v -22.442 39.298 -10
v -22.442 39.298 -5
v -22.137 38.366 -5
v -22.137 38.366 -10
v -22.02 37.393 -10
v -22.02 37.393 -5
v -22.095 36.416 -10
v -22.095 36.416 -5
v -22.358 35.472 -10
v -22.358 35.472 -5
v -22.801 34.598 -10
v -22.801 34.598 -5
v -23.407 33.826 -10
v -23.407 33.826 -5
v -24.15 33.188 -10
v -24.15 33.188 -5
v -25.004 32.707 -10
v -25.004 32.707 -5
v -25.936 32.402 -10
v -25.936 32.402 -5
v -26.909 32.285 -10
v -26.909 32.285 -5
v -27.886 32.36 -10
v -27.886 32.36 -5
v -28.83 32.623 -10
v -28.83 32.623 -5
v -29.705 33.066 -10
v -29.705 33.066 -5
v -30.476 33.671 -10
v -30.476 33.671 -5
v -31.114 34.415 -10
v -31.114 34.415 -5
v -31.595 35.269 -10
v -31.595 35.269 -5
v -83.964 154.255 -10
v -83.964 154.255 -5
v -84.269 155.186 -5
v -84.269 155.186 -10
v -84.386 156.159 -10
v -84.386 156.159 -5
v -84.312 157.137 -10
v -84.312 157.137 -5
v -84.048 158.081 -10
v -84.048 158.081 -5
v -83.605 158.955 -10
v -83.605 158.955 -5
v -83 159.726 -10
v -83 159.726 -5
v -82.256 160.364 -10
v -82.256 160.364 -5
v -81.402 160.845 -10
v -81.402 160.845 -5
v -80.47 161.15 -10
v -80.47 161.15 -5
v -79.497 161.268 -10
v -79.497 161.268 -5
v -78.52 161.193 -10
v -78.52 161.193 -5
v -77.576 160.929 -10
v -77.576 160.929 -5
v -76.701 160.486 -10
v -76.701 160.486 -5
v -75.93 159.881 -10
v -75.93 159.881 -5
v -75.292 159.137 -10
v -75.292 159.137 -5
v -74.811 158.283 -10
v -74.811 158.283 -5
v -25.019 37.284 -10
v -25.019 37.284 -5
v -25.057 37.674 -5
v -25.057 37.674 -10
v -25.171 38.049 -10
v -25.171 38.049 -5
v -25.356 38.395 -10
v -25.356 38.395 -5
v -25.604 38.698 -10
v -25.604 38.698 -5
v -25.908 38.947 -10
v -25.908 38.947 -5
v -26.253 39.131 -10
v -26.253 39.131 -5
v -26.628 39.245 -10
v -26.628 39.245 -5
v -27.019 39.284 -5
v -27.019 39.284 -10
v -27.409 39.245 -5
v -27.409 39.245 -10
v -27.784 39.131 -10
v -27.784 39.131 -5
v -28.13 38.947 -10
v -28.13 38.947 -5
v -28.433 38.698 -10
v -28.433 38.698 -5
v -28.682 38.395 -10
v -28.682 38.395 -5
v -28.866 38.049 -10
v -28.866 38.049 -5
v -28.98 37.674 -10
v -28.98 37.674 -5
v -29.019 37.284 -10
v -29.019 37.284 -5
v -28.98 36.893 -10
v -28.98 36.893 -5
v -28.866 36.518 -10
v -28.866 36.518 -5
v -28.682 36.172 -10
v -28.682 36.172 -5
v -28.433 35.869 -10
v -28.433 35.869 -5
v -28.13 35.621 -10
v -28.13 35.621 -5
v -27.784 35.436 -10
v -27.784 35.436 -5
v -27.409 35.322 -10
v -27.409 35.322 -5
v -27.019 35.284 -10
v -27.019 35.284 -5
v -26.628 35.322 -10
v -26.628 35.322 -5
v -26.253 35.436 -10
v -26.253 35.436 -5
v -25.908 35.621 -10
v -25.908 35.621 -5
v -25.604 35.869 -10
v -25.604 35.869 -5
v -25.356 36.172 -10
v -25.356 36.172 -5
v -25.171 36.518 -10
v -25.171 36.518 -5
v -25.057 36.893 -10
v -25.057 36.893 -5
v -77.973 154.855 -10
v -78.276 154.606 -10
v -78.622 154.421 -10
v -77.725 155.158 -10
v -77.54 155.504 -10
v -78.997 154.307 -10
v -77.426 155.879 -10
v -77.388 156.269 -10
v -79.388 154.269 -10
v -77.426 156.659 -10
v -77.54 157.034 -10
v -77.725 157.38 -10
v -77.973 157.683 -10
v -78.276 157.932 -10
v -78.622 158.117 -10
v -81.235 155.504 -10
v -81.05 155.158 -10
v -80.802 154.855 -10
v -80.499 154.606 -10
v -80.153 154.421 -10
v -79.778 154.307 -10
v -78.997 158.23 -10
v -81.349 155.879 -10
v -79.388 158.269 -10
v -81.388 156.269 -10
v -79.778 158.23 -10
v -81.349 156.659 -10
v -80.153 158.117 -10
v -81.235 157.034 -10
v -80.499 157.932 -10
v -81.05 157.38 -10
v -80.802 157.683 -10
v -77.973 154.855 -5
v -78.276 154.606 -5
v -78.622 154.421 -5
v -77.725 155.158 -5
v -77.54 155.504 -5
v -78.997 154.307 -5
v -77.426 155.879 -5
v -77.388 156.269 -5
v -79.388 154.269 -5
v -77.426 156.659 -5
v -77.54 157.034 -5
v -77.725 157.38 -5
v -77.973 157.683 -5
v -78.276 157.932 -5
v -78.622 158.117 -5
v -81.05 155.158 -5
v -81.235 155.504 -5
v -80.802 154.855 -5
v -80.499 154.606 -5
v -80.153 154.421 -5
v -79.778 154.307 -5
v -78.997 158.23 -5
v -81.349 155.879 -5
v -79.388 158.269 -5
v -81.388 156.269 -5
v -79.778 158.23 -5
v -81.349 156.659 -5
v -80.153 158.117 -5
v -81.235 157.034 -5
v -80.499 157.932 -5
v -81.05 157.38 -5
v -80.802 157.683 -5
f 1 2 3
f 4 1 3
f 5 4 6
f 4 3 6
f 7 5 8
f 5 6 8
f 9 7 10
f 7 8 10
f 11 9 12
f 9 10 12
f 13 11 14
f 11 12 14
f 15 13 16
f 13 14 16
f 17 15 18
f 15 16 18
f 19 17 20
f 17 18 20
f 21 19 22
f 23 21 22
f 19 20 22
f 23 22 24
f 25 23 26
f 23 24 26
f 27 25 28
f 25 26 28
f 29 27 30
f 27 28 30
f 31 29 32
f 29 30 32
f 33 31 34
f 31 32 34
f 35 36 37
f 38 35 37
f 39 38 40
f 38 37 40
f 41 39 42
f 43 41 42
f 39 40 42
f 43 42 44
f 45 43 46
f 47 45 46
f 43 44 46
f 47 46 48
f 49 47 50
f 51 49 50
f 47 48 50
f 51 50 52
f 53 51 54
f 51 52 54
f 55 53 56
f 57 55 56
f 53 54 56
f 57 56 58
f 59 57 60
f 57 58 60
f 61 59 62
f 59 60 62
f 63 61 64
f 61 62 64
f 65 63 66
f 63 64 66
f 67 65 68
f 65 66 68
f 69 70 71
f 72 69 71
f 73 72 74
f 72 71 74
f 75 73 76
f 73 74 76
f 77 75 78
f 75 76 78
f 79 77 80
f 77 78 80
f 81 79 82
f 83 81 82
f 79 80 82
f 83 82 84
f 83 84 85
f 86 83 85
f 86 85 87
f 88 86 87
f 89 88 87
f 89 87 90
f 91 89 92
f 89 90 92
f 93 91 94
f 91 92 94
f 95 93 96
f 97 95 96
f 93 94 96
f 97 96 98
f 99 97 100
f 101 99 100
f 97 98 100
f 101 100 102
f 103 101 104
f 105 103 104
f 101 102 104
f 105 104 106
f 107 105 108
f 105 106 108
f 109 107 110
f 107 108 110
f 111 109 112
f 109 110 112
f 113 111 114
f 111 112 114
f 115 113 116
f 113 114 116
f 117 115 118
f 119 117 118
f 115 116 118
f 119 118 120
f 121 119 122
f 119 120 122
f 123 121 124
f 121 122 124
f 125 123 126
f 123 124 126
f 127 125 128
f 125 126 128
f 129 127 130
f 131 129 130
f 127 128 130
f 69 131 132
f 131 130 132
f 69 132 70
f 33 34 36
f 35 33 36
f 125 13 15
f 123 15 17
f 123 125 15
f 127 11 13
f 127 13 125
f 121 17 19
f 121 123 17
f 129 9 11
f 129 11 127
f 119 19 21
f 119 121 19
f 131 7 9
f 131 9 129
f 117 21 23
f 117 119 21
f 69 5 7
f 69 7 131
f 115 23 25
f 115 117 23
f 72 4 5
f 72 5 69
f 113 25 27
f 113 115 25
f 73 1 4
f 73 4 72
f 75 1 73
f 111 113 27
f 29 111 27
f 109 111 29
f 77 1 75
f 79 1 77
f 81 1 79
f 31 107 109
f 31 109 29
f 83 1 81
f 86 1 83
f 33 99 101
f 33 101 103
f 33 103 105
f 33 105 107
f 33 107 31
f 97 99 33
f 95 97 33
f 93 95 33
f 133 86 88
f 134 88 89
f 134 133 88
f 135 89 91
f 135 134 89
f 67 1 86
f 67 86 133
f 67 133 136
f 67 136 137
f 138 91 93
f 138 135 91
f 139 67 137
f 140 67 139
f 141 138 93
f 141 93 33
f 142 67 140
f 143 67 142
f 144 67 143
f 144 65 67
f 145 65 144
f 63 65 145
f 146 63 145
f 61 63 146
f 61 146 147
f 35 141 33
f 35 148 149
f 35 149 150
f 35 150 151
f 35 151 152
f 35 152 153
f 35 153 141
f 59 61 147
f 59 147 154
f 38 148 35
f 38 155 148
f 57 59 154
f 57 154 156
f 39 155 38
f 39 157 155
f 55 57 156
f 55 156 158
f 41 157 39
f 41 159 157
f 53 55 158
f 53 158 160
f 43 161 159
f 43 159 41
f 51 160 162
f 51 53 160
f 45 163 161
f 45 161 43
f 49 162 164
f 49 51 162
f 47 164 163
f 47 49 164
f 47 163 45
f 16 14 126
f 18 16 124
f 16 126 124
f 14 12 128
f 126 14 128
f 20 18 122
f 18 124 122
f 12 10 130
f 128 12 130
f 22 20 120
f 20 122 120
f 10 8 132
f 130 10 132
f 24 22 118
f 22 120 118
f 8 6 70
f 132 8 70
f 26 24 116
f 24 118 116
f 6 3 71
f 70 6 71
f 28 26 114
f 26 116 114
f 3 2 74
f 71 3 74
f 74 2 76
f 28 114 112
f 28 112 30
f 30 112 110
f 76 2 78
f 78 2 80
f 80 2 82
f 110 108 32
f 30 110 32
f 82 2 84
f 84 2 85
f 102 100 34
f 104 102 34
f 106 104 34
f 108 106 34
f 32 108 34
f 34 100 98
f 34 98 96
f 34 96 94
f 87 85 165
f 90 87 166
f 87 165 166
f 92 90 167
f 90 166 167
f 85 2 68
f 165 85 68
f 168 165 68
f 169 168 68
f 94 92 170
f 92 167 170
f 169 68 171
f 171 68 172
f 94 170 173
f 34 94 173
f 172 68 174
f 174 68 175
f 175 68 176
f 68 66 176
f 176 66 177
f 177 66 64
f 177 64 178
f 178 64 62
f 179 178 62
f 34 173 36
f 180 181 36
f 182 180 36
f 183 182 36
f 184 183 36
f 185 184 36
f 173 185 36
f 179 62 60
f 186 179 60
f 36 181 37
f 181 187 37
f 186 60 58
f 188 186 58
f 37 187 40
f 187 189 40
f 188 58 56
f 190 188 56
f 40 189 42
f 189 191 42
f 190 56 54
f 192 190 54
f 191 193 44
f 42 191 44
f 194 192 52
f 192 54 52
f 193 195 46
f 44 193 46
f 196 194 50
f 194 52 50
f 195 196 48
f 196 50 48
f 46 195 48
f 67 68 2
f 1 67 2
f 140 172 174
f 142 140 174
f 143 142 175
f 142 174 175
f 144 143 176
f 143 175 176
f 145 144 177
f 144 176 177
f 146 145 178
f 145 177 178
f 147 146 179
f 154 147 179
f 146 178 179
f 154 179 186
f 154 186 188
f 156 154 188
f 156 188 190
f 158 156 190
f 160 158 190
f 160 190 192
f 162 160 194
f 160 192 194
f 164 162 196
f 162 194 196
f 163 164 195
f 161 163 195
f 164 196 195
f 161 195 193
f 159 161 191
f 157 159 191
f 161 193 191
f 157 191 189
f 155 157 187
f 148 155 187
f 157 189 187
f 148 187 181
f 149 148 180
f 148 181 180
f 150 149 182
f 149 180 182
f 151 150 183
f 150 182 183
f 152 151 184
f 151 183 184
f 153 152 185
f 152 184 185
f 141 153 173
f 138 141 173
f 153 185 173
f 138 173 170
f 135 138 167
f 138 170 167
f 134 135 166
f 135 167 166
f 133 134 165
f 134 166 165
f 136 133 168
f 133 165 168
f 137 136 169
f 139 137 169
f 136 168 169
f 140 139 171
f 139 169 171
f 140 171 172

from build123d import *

# Parameters (mm, degrees)
BOSS_EXTRUDE1_START = -5
SKETCH1_R           = 2
BOSS_EXTRUDE1_DEPTH = 5


with BuildPart() as part:
    # Sketch1 → Boss-Extrude1 (new body)
    with BuildSketch(Plane.XY.offset(BOSS_EXTRUDE1_START)):
        with BuildLine():
            Line((-74.811187919, 158.283111414), (-22.442309188, 39.297815934))
            ThreePointArc((-22.442309188, 39.297815934), (-25.004479063, 32.707270772), (-31.595024225, 35.269440647))
            Line((-31.595024225, 35.269440647), (-83.963902956, 154.254736127))
            ThreePointArc((-83.963902956, 154.254736127), (-81.401733081, 160.845281289), (-74.811187919, 158.283111414))
        make_face()
        with Locations((-79.387545438, 156.26892377)):
            Circle(SKETCH1_R, mode=Mode.SUBTRACT)
        with Locations((-27.018666706, 37.283628291)):
            Circle(SKETCH1_R, mode=Mode.SUBTRACT)
    extrude(amount=-BOSS_EXTRUDE1_DEPTH)


solid = part.part
